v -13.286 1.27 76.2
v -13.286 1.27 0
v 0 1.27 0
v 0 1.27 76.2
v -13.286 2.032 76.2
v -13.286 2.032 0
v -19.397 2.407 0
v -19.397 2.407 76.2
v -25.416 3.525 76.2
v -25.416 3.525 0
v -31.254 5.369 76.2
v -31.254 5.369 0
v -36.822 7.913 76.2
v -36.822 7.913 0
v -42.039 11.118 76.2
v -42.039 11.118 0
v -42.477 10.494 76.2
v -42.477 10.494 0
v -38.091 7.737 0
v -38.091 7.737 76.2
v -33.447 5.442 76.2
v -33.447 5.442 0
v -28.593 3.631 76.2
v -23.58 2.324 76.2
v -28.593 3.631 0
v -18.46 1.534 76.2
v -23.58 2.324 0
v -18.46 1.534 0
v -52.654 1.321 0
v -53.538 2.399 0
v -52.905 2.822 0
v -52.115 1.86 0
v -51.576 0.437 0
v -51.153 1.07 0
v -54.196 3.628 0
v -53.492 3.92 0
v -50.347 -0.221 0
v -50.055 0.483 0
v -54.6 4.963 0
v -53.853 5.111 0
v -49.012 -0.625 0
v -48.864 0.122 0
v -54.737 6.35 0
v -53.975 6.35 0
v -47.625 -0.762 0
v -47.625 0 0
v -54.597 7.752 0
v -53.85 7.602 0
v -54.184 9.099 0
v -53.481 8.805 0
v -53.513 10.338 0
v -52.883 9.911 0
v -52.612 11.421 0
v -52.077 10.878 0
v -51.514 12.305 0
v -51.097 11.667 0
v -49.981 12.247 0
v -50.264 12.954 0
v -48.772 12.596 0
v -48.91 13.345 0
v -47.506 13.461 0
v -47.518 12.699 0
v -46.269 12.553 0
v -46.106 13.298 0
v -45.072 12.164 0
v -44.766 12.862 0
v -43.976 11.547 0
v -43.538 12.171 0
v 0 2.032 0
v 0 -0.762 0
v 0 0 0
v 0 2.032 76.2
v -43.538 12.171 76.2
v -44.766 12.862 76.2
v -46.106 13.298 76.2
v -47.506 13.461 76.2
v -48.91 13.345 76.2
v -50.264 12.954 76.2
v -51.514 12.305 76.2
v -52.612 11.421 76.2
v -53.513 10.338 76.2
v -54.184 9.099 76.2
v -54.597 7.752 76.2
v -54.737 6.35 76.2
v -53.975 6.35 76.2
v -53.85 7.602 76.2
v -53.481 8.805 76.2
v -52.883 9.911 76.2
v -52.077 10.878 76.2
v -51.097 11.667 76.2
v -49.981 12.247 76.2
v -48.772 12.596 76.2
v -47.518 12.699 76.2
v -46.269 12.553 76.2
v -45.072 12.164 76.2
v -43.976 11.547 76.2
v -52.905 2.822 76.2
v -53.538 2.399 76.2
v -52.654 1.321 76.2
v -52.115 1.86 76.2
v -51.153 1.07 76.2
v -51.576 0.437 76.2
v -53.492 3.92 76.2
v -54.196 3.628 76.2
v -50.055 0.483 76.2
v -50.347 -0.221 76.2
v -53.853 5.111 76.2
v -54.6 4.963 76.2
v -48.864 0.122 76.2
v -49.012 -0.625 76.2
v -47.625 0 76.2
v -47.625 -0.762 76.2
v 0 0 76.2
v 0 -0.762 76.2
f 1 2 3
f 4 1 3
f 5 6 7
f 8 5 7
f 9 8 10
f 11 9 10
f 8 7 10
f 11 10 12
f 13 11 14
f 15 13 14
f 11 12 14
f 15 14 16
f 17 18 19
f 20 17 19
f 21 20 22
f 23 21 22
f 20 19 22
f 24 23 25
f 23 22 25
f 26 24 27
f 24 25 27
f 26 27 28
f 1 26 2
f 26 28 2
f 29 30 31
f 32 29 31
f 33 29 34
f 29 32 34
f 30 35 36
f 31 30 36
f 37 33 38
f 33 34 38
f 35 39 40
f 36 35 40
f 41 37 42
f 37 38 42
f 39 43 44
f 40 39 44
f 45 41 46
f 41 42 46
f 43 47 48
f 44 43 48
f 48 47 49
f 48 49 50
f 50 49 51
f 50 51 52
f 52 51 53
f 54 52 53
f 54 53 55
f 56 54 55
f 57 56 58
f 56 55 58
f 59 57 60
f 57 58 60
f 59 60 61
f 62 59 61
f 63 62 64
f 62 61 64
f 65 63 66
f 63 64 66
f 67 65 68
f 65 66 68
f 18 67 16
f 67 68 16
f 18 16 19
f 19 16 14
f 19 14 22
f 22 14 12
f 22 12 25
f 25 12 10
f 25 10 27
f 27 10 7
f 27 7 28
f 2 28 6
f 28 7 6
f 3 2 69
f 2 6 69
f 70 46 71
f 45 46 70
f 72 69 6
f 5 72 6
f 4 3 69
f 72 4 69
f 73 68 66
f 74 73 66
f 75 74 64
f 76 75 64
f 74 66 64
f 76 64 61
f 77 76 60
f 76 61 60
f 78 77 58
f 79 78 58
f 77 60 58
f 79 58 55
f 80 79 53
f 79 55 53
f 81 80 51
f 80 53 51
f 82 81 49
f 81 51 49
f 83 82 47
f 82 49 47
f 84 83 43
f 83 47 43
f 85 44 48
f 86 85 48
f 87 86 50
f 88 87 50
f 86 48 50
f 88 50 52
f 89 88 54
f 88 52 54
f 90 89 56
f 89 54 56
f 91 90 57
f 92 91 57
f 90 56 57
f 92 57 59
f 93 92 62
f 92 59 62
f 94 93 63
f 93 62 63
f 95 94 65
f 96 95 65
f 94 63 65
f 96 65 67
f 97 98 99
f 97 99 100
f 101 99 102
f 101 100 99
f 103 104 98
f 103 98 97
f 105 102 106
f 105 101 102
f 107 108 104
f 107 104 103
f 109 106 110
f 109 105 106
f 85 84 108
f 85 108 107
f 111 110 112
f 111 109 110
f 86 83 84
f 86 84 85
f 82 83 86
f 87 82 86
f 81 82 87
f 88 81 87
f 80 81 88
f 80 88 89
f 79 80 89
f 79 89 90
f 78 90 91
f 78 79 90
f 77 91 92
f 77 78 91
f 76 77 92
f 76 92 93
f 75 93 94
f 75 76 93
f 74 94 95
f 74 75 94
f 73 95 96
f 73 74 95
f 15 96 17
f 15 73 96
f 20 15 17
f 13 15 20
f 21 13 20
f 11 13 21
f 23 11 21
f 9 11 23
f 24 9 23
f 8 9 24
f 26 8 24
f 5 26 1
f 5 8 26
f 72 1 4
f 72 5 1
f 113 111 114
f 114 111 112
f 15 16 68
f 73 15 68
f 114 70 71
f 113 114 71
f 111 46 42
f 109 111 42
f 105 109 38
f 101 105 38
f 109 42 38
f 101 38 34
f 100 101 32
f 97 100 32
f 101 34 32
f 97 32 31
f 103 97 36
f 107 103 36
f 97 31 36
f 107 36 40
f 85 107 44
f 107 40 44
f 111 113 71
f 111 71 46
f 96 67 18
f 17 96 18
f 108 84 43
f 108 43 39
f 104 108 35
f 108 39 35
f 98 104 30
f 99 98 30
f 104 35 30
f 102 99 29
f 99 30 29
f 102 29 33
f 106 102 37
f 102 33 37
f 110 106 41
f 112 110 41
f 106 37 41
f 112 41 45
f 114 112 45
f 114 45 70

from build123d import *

# Parameters (mm, degrees)
F1_DEPTH = 76.2


with BuildPart() as f1:
    # F0 (on Top) → F1 (new body)
    with BuildSketch(Plane.XY):
        with BuildLine():
            Line((0, -0.762), (0, 0))
            Line((0, 0), (-47.625, 0))
            ThreePointArc((-47.625, 0), (-52.115128, 1.859872), (-53.975, 6.35))
            ThreePointArc((-53.975, 6.35), (-50.553519, 11.984384), (-43.976172, 11.546976))
            Line((-43.976172, 11.546976), (-42.47671, 10.494194))
            ThreePointArc((-42.47671, 10.494194), (-28.592771, 3.63091), (-13.286089, 1.27))
            Line((-13.286089, 1.27), (0, 1.27))
            Line((0, 1.27), (0, 2.032))
            Line((0, 2.032), (-13.286089, 2.032))
            ThreePointArc((-13.286089, 2.032), (-28.363171, 4.357496), (-42.038851, 11.117831))
            Line((-42.038851, 11.117831), (-43.538313, 12.170613))
            ThreePointArc((-43.538313, 12.170613), (-50.904941, 12.66051), (-54.737, 6.35))
            ThreePointArc((-54.737, 6.35), (-52.653943, 1.321057), (-47.625, -0.762))
            Line((-47.625, -0.762), (0, -0.762))
        make_face()
    extrude(amount=F1_DEPTH)


solid = f1.part
